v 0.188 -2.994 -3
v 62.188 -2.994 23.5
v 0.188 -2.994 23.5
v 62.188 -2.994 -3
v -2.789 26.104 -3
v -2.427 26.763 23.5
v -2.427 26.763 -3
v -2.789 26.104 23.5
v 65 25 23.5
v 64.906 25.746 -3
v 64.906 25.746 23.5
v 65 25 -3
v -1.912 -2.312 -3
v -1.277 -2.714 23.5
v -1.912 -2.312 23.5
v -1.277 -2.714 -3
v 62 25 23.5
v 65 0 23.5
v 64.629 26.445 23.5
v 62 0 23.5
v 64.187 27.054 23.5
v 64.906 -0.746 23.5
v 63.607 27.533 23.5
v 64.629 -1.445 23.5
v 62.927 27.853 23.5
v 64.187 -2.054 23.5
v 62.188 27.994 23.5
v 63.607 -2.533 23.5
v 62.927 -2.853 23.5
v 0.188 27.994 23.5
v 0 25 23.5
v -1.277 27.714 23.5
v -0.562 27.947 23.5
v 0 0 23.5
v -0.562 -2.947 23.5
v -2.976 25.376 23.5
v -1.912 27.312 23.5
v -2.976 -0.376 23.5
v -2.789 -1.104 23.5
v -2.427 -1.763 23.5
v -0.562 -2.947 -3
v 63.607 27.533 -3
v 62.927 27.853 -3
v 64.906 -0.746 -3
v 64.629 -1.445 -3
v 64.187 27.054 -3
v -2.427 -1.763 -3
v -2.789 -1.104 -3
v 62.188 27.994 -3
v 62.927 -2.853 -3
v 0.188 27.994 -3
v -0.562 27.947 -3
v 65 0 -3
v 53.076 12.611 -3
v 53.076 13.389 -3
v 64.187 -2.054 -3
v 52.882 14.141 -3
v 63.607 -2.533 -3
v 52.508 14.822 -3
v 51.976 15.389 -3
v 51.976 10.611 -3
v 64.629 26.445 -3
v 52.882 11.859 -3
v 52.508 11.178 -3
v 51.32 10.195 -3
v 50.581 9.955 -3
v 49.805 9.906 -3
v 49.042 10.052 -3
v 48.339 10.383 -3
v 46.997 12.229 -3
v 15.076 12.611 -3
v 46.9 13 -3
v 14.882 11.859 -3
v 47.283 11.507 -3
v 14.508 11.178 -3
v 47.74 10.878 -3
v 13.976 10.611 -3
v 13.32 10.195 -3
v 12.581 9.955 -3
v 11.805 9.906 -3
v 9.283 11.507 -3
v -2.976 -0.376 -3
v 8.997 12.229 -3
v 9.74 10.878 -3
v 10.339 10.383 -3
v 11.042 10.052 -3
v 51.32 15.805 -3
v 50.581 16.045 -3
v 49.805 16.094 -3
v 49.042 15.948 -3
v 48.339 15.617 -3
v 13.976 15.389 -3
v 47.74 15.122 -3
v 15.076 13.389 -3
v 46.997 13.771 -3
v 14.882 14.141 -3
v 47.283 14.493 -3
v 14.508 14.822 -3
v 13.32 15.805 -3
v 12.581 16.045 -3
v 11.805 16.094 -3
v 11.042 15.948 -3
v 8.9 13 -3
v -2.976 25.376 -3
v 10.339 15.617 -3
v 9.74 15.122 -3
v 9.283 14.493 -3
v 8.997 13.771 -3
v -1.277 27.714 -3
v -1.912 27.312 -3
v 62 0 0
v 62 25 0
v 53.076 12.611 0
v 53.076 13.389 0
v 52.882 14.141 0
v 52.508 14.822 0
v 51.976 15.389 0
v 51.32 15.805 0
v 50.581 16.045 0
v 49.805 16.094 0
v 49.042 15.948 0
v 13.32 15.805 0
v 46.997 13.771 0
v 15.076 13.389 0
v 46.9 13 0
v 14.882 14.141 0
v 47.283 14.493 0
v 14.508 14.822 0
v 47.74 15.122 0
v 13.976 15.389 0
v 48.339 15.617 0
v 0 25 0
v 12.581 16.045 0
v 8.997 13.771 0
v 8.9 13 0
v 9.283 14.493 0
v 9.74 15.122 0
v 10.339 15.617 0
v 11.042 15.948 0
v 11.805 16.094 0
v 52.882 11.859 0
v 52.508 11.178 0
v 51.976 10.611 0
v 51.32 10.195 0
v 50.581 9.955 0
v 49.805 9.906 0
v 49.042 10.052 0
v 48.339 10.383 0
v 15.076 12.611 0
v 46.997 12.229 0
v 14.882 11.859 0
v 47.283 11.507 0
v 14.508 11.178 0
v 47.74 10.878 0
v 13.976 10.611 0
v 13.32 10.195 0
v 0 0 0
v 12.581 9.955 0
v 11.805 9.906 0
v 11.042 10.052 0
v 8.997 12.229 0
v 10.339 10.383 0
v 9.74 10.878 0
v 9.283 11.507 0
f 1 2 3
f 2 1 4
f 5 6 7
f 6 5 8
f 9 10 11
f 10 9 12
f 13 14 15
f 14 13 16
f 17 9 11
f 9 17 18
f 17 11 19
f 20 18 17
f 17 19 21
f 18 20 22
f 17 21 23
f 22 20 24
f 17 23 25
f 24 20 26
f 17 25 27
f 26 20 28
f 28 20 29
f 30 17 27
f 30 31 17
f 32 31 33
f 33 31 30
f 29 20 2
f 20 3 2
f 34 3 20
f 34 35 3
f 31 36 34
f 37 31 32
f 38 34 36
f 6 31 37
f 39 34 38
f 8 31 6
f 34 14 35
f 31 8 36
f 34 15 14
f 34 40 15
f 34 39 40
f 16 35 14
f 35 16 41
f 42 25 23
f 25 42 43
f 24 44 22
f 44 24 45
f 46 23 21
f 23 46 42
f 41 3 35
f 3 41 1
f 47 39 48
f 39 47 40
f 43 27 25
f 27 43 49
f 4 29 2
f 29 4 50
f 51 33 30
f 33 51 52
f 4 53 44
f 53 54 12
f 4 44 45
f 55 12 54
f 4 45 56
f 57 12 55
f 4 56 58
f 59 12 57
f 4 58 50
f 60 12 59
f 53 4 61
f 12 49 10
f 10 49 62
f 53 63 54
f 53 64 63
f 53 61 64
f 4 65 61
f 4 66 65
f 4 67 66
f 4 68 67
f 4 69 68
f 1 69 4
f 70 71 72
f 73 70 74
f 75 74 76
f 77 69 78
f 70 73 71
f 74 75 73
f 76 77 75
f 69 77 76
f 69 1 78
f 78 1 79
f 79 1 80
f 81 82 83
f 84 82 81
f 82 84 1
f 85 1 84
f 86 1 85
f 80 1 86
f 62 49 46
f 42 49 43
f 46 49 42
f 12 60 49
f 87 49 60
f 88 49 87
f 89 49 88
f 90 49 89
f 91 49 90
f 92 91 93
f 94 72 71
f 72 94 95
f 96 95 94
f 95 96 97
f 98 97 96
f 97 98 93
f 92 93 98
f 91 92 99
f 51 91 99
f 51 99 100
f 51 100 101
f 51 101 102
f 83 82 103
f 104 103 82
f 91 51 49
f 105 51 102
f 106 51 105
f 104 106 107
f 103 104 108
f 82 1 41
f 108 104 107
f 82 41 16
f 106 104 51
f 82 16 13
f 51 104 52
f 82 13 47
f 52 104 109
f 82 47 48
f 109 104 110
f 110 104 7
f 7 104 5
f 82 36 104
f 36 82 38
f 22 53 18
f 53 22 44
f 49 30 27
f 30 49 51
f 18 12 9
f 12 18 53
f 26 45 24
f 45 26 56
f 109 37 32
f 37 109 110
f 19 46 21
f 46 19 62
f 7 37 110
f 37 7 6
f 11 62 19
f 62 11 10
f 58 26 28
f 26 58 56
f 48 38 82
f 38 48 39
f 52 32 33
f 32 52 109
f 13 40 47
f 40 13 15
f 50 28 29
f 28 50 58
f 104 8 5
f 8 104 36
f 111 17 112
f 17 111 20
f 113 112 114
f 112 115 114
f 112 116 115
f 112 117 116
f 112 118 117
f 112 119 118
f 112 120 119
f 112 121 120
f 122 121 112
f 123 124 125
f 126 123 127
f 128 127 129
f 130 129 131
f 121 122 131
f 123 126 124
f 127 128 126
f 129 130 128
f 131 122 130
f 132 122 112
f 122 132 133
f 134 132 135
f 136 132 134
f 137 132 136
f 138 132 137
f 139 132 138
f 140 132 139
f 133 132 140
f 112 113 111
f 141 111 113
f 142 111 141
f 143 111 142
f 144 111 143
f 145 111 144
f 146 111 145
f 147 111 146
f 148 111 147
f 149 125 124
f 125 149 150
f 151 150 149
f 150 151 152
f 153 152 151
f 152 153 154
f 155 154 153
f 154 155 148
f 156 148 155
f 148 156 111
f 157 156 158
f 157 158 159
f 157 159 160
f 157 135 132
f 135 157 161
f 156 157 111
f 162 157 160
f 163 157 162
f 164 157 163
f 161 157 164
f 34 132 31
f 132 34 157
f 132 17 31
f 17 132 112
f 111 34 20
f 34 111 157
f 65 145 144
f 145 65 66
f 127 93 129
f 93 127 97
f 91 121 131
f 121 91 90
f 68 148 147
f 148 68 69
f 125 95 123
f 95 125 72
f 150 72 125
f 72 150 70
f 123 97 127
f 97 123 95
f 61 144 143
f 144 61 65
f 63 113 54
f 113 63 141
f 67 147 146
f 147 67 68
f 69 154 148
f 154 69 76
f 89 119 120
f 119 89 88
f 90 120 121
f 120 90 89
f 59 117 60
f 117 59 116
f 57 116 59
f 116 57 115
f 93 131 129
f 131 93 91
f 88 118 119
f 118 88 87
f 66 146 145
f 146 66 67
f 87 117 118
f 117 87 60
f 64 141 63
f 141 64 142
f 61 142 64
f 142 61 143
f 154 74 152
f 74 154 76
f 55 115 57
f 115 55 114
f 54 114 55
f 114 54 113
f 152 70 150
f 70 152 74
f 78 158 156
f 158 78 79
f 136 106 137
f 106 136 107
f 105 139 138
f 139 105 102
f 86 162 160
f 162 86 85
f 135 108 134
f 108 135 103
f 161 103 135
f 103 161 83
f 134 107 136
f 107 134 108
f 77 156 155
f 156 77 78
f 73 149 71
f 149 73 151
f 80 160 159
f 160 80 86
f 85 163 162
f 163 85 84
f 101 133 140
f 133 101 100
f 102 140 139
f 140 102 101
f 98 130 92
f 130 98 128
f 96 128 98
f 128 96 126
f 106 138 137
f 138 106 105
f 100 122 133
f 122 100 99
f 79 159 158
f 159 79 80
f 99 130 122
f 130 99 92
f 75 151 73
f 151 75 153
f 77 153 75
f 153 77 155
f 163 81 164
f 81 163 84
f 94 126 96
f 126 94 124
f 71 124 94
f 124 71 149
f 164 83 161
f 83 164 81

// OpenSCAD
// file: lib/shapes.scad
module arrow(width=4, height=4, depth=1) {
	x = width / 4;
	y = height / 4;
	linear_extrude(height = depth)
		polygon(points=[[0, -2*y], [2*x, 0], [0, 2*y], [0, y], [-2*x, y], [-2*x, -y], [0, -y], [0, -2*y]]);
}

module centerPos(size=8, depth=1) {
	i = size / 10;

rotate([0, 0, -90]) {
	difference() {
		cylinder(r=size, h=depth);
		translate([0, 0, -.1])
			cylinder(r=8*i, h=depth+.2);
			translate([-3*i,0,-.1])
				cube([6*i,15*i,depth+.2]);
		}
		cylinder(r=3*i,h=depth);
		translate([-i,0,0])
			cube([2*i,13*i,depth]);
		translate([-i, 16*i, 0])
			cube([2*i, 8*i, depth]);
		translate([-4*i, 19*i, 0])
			cube([8*i, 2*i, depth]);
}
}
// file: lib/parts.scad
// @2014 - mkellner@robotranch.org

slop = 0.4;

module potentiometer(angle = 0) {

	potCylR = (17 + slop) / 2;
	potCylD = 9.3;
	potShaftR = (6.76 + slop) / 2;
	potShaftD = 15;
	potBoard = 12;
	potBoardD = 6.3;
	potTabW = 3.3;
	potTabH = 2.0;
	potTabD = 2.3;

	rotate([0, 180, angle])
	translate([0, 0, -potCylD/2])

	union() {
		cylinder(r = potCylR, h = potCylD, center = true);
		translate([0, 0, potCylD])
			cylinder(r = potShaftR, h = potShaftD, center = true);
		translate([0, -potCylR, potCylD/2 - potBoardD])
			cube([potBoard, potCylR * 2, potBoardD]);
		translate([-potTabW/2, -potCylR-0.5, potCylD / 2])
			#cube([potTabW, potTabH, potTabD]);
	}
}

module sw3pdt() {
	swBodyW = 18;
	swBodyH = 17;
	swBodyD = 20;
	swShaftR = (11.72 + slop) / 2;
	swShaftD = 12.5;
	swShaft2R = 8 / 2;
	swShaft2D = 5.11;
	swShaft3D = 5;

	rotate([0, 180, 0])
		union() {
			translate([-swBodyW/2, -swBodyH/2, -swBodyD])
				#cube([swBodyW, swBodyH, swBodyD]);
			translate([0, 0, swShaftD / 2]) //  swBodyD + swShaftD/2])
				cylinder(r = swShaftR, h = swShaftD, center = true);
			translate([0, 0, swShaftD + swShaft2D / 2]) //  swBodyD + swShaftD/2])
				cylinder(r = swShaft2R, h = swShaft3D, center = true);
			translate([0, 0, swShaftD + swShaft2D + swShaft3D / 2]) //  swBodyD + swShaftD/2])
				cylinder(r = swShaftR, h = swShaft3D, center = true);
		}
}

module swdp3t() {
    swBodyW = 12.62;
    swBodyH = 13;
    swBodyD = 14.5;
    swShaftR = (5.8 + slop) / 2;
    swShaftD = 8.5;

	rotate([0, 180, 0])
	union() {
	    translate([-swBodyW/2, -swBodyH/2, -swBodyD])
			#cube([swBodyW, swBodyH, swBodyD]);
		translate([0, 0, swShaftD / 2]) //  swBodyD + swShaftD/2])
			cylinder(r = swShaftR, h = swShaftD, center = true);
	}
}

module swspst(angle = 0) {
    swBodyW = 8;
    swBodyH = 13;
    swBodyD = 14.5;
    swShaftR = (5.8 + slop) / 2;
    swShaftD = 8.5;

	rotate([0, 180, angle])
	union() {
	    translate([-swBodyW/2, -swBodyH/2, -swBodyD])
			#cube([swBodyW, swBodyH, swBodyD]);
		translate([0, 0, swShaftD / 2]) //  swBodyD + swShaftD/2])
			cylinder(r = swShaftR, h = swShaftD, center = true);
	}
}

module socket(angle = 90) {
	sktR = (8.67 + slop) / 2;
	sktD = 7.6;
	sktBaseR = 20.40 / 2;
	sktBaseH = 23.6;

	rotate([angle, 0, 90])
		union() {
			cylinder(r = sktR, h = sktD);
			translate([0, 0, -sktBaseH])
			cylinder(r = sktBaseR, h = sktBaseH);
		}
}

module smDcJack() {
	dcJackR = (7.75 + slop) / 2;
	dcJackD = 5.5;
	dcJackBaseR = 10.75 / 2;
	dcJackBaseH = 15.65;

	rotate([-90, 0, 0])
		union() {
		    cylinder(r = dcJackR, h = dcJackD);
		    translate([0, 0, -dcJackBaseH])
		    cylinder(r = dcJackBaseR, h = dcJackBaseH);
		}
}

module ledMount() {
	ledMountR = (7.75 + slop) / 2;
	ledMountD = 10;
	ledMountBaseR1 = 9 / 2;
	ledMountBaseR2 = 8 / 2;
	ledMountBaseH = 3.8;

	rotate([0, 180, 0])
		union() {
		    cylinder(r1 = ledMountBaseR1, r2 = ledMountBaseR2, h = ledMountBaseH);
		    translate([0, 0, -ledMountD])
			    cylinder(r = ledMountR, h = ledMountD);
		}
}

module ledMountSm() {
	ledMountR = (7 + slop) / 2;
	ledMountD = 6.7;
	ledMountBaseR = 7.9 / 2;
	ledMountBaseH = 0.9;

	rotate([0, 180, 0])
		union() {
		    cylinder(r = ledMountBaseR, h = ledMountBaseH);
		    translate([0, 0, -ledMountD])
			    cylinder(r = ledMountR, h = ledMountD);
		}
}
// main file
// @2014 - mkellner@robotranch.orog
$fn=25;

use <lib/parts.scad>;
use <lib/shapes.scad>;

doBox = 1;
doFoot = 2;
doLabelSlice = 3;


perform = doBox;			// doBox, doFoot or doLabelSlice



textDepth = .5;

wallD = 3;

inBoxW = 62;			// Altoids 58.5
inBoxH = 25; // 98;			// Altoids 93.5
inBoxD = 23; // 29.5;			// Altoids 21.5

outBoxW = inBoxW; // + wallD * 2;
outBoxH = inBoxH; // + wallD * 2;
outBoxD = inBoxD + wallD;

footD = 4;
footWallD = 3;

quarterR = 26.5 / 2;
quarterH = 2;

module quarter() {
	cylinder(r=quarterR,h=quarterH+5,center=true);
}

module PCB(width, height, pcbZ=1, componentZ=16, traceZ = 3) {
translate([3, inBoxH - height, 13]) {
//	cube([width, height, pcbZ]);
//	translate([5, 5, pcbZ])
//		cube([width - 10, height - 10, componentZ]);
//	translate([5, 5, -traceZ])
//		cube([width - 10, height - 10, traceZ]);
}
	difference() {
		union() {
		translate([wallD-3.5, inBoxH - height, 0])
			cube([13.5, 8.5, 13]);
		translate([wallD + 46.50, inBoxH - height, 0])
			cube([12.5, 8.5, 13]);
		}
		translate([wallD + 3.85, inBoxH - height + 3.85, 5])
			#cylinder(r=1, h=16);
		translate([wallD + 3.85 + 46.50, inBoxH - height + 3.85, 5])
			#cylinder(r=1, h=16);
	}
}


module label(tx = "label", sz = 5, depth=1, font = "Courier", halign = "center", valign = "center") {
	linear_extrude(height = depth)
		text(tx, size=sz, font=font, halign=halign, valign=valign);

}
module foot() {
	difference()
		{
		translate([0, 0, -wallD + inBoxD])
			minkowski() {
				cube([outBoxW, outBoxH, footD + wallD]);
				cylinder(r=3,h=.5);
			}
		translate([-wallD, -wallD, -wallD/2-.2])
			rotate([2,0,0])
				cube([outBoxW + 2*wallD, wallD+1, outBoxD]);
		translate([-wallD, outBoxH-1, -wallD/2-.2])
			rotate([-2,0,0])
				cube([outBoxW + 2*wallD, wallD+1, outBoxD]);
		translate([-wallD, -wallD, -wallD/2-.2])
			rotate([0,-2,0])
				cube([wallD+1, outBoxH + 2*wallD, outBoxD]);
		translate([outBoxW-1, -wallD, -wallD/2-.2])
			rotate([0,2,0])
				cube([wallD+2, outBoxH + 2*wallD, outBoxD]);

		translate([0, -11, outBoxD-10-wallD/2-.2])
			rotate([0, 0, 45])
				cube([10, 20, 10]);
		translate([-10.5, outBoxH, outBoxD-10-wallD/2-.2])
			rotate([0, 0, -45])
				cube([10, 20, 10]);
		translate([outBoxW-5, -1, outBoxD-10-wallD/2-.2])
			rotate([0, 0, -45])
				cube([10, 20, 10]);
		translate([outBoxW+1, outBoxH-5, outBoxD-10-wallD/2-.2])
			rotate([0, 0, 45])
				cube([10, 20, 10]);

		//config1();
		box();
		translate([outBoxW/2, -11, inBoxD+2.5-wallD])
			#quarter();

		translate([wallD+footWallD, wallD+footWallD, wallD-3])
			minkowski() {
				cube([inBoxW-(2*footWallD + 6), inBoxH-(2*footWallD + 6), inBoxD+1-wallD]);
				sphere(r=3);
			}

		rotate([0, 0, 90])
			{
				translate([50, -30, outBoxD + wallD -1.7 -textDepth])
					label(tx="robotranch", sz=14, font="Futura");
				translate([50, -50, outBoxD + wallD -1.7 -textDepth])
					label(tx=".org", sz=14, font="Futura");
				translate([50, -10, outBoxD + wallD -1.7 -textDepth])
					label(tx="2014", sz=14, font="Futura");
				}
	}
}

module box() {
	difference() {
//		translate([-wallD, -wallD, -wallD])
		translate([0, 0, -wallD])
			minkowski() {
				cube([outBoxW, outBoxH, outBoxD]);
				cylinder(r=3,h=.5);
			}
		cube([inBoxW, inBoxH, inBoxD+1]);

	}
}

//translate([0, 0, 0])
//	potentiometer();
// sw3pdt();
//socket();
//smDcJack();
//ledMount();
//swdp3t();

module config1() {		// good for HogsFoot, Screaming Bird
	offsetStompX = 12;
	offsetStompY = 15;
	offsetLEDX = inBoxW - 12;
	offsetLEDY = 15;
	offsetPotX = inBoxW - 12;
	offsetPotY = inBoxH - 12;
	offsetPot2X = 12;
	offsetPot2Y = inBoxH - 12;
	offsetDCX = inBoxH / 3;
	offsetDCY = inBoxH-.1;
	offsetDCZ = 6;
	offsetJackInX = inBoxW-.1;
	offsetJackInY = 37;
	offsetJackInZ = 10.5;
	offsetJackOutX = .1;
	offsetJackOutY = 37;
	offsetJackOutZ = 10.5;

	difference() {
		box();
		translate([offsetStompX, offsetStompY, 0])
			#color([0,0,1]) sw3pdt();
		translate([offsetLEDX, offsetLEDY, -wallD])
			#ledMount();
		translate([offsetPotX, offsetPotY, 0])
			#potentiometer(angle = 90);
		translate([offsetPot2X, offsetPot2Y, 0])
			#potentiometer(angle = 90);
		translate([offsetDCX, offsetDCY, offsetDCZ])
			#smDcJack();
		translate([offsetJackInX, offsetJackInY, offsetJackInZ])
			#socket(angle = 90);
		translate([offsetJackOutX, offsetJackOutY, offsetJackOutZ])
			#socket(angle = 270);


		// back face
		rotate([-90, 0, 180]) {
			translate([-(outBoxW/2), -(outBoxD/3)+3, wallD-textDepth])
				label(tx="Little", sz=8, font="Futura");
			translate([-(outBoxW/2), -2*(outBoxD/3)+2, wallD-textDepth])
				label(tx="Angel", sz=8, font="Futura");
		}

		// front face
		rotate([-90, 0, 0]) {
			translate([(offsetDCX)-12, -offsetDCZ, (outBoxH + wallD) -textDepth])
				label(tx="9v", sz=7, font="Futura");
			translate([(offsetDCX)+12, -offsetDCZ, (outBoxH + wallD) -textDepth])
				centerPos(size=4.8);
//				label(tx="center", sz=3.5, font="Futura");
//			translate([(offsetDCX)+7, -19.5, (outBoxH + wallD) -1])
//				label(tx="+", sz=3.5, font="Futura");
		}

		// right face
		rotate([90, 180, 270]) {
			translate([offsetJackOutY + 16, -offsetJackOutZ, wallD-textDepth])
				label(tx="out", sz=8, font="Futura");
			translate([offsetJackOutY + 39, -offsetJackOutZ, wallD-textDepth])
				arrow(width=20, height=10, depth=1);
		}

		// left face
		rotate([90, 180, 90]) {
			translate([-offsetJackInY -37, -offsetJackInZ, offsetJackInX+wallD-textDepth])
				label(tx="in", sz=8, font="Futura", depth=2);
			translate([-offsetJackInY -19, -offsetJackInZ-1, offsetJackInX+wallD-textDepth])
				arrow(width=20, height=10, depth=2);
		}

	}

}


module config2() {		// good for HogsFoot, Screaming Bird
	offsetStompX = 12;
	offsetStompY = 15;
	offsetLEDX = inBoxW - 12;
	offsetLEDY = 15;
	offsetPotX = inBoxW - 12;
	offsetPotY = inBoxH - 12;
	offsetPot2X = 12;
	offsetPot2Y = inBoxH - 12;
	offsetDCX = inBoxH / 3;
	offsetDCY = inBoxH-.1;
	offsetDCZ = 6;
	offsetJackInX = inBoxW-.1;
	offsetJackInY = 37;
	offsetJackInZ = 10.5;
	offsetJackOutX = .1;
	offsetJackOutY = 37;
	offsetJackOutZ = 10.5;

	difference() {
		box();
		translate([offsetPotX, offsetPotY, 0])
			#swdp3t(angle = 90);
		translate([offsetPot2X, offsetPot2Y, 0])
			#swdp3t(angle = 90);

	}

}

if (perform == doBox) {
	config2();
*	PCB(56, 51);
} else if (perform == doFoot) {
	foot();
} else if (perform == doLabelSlice) {
	translate([0, 0, 2])
	projection(cut = false)
		config1();
}
